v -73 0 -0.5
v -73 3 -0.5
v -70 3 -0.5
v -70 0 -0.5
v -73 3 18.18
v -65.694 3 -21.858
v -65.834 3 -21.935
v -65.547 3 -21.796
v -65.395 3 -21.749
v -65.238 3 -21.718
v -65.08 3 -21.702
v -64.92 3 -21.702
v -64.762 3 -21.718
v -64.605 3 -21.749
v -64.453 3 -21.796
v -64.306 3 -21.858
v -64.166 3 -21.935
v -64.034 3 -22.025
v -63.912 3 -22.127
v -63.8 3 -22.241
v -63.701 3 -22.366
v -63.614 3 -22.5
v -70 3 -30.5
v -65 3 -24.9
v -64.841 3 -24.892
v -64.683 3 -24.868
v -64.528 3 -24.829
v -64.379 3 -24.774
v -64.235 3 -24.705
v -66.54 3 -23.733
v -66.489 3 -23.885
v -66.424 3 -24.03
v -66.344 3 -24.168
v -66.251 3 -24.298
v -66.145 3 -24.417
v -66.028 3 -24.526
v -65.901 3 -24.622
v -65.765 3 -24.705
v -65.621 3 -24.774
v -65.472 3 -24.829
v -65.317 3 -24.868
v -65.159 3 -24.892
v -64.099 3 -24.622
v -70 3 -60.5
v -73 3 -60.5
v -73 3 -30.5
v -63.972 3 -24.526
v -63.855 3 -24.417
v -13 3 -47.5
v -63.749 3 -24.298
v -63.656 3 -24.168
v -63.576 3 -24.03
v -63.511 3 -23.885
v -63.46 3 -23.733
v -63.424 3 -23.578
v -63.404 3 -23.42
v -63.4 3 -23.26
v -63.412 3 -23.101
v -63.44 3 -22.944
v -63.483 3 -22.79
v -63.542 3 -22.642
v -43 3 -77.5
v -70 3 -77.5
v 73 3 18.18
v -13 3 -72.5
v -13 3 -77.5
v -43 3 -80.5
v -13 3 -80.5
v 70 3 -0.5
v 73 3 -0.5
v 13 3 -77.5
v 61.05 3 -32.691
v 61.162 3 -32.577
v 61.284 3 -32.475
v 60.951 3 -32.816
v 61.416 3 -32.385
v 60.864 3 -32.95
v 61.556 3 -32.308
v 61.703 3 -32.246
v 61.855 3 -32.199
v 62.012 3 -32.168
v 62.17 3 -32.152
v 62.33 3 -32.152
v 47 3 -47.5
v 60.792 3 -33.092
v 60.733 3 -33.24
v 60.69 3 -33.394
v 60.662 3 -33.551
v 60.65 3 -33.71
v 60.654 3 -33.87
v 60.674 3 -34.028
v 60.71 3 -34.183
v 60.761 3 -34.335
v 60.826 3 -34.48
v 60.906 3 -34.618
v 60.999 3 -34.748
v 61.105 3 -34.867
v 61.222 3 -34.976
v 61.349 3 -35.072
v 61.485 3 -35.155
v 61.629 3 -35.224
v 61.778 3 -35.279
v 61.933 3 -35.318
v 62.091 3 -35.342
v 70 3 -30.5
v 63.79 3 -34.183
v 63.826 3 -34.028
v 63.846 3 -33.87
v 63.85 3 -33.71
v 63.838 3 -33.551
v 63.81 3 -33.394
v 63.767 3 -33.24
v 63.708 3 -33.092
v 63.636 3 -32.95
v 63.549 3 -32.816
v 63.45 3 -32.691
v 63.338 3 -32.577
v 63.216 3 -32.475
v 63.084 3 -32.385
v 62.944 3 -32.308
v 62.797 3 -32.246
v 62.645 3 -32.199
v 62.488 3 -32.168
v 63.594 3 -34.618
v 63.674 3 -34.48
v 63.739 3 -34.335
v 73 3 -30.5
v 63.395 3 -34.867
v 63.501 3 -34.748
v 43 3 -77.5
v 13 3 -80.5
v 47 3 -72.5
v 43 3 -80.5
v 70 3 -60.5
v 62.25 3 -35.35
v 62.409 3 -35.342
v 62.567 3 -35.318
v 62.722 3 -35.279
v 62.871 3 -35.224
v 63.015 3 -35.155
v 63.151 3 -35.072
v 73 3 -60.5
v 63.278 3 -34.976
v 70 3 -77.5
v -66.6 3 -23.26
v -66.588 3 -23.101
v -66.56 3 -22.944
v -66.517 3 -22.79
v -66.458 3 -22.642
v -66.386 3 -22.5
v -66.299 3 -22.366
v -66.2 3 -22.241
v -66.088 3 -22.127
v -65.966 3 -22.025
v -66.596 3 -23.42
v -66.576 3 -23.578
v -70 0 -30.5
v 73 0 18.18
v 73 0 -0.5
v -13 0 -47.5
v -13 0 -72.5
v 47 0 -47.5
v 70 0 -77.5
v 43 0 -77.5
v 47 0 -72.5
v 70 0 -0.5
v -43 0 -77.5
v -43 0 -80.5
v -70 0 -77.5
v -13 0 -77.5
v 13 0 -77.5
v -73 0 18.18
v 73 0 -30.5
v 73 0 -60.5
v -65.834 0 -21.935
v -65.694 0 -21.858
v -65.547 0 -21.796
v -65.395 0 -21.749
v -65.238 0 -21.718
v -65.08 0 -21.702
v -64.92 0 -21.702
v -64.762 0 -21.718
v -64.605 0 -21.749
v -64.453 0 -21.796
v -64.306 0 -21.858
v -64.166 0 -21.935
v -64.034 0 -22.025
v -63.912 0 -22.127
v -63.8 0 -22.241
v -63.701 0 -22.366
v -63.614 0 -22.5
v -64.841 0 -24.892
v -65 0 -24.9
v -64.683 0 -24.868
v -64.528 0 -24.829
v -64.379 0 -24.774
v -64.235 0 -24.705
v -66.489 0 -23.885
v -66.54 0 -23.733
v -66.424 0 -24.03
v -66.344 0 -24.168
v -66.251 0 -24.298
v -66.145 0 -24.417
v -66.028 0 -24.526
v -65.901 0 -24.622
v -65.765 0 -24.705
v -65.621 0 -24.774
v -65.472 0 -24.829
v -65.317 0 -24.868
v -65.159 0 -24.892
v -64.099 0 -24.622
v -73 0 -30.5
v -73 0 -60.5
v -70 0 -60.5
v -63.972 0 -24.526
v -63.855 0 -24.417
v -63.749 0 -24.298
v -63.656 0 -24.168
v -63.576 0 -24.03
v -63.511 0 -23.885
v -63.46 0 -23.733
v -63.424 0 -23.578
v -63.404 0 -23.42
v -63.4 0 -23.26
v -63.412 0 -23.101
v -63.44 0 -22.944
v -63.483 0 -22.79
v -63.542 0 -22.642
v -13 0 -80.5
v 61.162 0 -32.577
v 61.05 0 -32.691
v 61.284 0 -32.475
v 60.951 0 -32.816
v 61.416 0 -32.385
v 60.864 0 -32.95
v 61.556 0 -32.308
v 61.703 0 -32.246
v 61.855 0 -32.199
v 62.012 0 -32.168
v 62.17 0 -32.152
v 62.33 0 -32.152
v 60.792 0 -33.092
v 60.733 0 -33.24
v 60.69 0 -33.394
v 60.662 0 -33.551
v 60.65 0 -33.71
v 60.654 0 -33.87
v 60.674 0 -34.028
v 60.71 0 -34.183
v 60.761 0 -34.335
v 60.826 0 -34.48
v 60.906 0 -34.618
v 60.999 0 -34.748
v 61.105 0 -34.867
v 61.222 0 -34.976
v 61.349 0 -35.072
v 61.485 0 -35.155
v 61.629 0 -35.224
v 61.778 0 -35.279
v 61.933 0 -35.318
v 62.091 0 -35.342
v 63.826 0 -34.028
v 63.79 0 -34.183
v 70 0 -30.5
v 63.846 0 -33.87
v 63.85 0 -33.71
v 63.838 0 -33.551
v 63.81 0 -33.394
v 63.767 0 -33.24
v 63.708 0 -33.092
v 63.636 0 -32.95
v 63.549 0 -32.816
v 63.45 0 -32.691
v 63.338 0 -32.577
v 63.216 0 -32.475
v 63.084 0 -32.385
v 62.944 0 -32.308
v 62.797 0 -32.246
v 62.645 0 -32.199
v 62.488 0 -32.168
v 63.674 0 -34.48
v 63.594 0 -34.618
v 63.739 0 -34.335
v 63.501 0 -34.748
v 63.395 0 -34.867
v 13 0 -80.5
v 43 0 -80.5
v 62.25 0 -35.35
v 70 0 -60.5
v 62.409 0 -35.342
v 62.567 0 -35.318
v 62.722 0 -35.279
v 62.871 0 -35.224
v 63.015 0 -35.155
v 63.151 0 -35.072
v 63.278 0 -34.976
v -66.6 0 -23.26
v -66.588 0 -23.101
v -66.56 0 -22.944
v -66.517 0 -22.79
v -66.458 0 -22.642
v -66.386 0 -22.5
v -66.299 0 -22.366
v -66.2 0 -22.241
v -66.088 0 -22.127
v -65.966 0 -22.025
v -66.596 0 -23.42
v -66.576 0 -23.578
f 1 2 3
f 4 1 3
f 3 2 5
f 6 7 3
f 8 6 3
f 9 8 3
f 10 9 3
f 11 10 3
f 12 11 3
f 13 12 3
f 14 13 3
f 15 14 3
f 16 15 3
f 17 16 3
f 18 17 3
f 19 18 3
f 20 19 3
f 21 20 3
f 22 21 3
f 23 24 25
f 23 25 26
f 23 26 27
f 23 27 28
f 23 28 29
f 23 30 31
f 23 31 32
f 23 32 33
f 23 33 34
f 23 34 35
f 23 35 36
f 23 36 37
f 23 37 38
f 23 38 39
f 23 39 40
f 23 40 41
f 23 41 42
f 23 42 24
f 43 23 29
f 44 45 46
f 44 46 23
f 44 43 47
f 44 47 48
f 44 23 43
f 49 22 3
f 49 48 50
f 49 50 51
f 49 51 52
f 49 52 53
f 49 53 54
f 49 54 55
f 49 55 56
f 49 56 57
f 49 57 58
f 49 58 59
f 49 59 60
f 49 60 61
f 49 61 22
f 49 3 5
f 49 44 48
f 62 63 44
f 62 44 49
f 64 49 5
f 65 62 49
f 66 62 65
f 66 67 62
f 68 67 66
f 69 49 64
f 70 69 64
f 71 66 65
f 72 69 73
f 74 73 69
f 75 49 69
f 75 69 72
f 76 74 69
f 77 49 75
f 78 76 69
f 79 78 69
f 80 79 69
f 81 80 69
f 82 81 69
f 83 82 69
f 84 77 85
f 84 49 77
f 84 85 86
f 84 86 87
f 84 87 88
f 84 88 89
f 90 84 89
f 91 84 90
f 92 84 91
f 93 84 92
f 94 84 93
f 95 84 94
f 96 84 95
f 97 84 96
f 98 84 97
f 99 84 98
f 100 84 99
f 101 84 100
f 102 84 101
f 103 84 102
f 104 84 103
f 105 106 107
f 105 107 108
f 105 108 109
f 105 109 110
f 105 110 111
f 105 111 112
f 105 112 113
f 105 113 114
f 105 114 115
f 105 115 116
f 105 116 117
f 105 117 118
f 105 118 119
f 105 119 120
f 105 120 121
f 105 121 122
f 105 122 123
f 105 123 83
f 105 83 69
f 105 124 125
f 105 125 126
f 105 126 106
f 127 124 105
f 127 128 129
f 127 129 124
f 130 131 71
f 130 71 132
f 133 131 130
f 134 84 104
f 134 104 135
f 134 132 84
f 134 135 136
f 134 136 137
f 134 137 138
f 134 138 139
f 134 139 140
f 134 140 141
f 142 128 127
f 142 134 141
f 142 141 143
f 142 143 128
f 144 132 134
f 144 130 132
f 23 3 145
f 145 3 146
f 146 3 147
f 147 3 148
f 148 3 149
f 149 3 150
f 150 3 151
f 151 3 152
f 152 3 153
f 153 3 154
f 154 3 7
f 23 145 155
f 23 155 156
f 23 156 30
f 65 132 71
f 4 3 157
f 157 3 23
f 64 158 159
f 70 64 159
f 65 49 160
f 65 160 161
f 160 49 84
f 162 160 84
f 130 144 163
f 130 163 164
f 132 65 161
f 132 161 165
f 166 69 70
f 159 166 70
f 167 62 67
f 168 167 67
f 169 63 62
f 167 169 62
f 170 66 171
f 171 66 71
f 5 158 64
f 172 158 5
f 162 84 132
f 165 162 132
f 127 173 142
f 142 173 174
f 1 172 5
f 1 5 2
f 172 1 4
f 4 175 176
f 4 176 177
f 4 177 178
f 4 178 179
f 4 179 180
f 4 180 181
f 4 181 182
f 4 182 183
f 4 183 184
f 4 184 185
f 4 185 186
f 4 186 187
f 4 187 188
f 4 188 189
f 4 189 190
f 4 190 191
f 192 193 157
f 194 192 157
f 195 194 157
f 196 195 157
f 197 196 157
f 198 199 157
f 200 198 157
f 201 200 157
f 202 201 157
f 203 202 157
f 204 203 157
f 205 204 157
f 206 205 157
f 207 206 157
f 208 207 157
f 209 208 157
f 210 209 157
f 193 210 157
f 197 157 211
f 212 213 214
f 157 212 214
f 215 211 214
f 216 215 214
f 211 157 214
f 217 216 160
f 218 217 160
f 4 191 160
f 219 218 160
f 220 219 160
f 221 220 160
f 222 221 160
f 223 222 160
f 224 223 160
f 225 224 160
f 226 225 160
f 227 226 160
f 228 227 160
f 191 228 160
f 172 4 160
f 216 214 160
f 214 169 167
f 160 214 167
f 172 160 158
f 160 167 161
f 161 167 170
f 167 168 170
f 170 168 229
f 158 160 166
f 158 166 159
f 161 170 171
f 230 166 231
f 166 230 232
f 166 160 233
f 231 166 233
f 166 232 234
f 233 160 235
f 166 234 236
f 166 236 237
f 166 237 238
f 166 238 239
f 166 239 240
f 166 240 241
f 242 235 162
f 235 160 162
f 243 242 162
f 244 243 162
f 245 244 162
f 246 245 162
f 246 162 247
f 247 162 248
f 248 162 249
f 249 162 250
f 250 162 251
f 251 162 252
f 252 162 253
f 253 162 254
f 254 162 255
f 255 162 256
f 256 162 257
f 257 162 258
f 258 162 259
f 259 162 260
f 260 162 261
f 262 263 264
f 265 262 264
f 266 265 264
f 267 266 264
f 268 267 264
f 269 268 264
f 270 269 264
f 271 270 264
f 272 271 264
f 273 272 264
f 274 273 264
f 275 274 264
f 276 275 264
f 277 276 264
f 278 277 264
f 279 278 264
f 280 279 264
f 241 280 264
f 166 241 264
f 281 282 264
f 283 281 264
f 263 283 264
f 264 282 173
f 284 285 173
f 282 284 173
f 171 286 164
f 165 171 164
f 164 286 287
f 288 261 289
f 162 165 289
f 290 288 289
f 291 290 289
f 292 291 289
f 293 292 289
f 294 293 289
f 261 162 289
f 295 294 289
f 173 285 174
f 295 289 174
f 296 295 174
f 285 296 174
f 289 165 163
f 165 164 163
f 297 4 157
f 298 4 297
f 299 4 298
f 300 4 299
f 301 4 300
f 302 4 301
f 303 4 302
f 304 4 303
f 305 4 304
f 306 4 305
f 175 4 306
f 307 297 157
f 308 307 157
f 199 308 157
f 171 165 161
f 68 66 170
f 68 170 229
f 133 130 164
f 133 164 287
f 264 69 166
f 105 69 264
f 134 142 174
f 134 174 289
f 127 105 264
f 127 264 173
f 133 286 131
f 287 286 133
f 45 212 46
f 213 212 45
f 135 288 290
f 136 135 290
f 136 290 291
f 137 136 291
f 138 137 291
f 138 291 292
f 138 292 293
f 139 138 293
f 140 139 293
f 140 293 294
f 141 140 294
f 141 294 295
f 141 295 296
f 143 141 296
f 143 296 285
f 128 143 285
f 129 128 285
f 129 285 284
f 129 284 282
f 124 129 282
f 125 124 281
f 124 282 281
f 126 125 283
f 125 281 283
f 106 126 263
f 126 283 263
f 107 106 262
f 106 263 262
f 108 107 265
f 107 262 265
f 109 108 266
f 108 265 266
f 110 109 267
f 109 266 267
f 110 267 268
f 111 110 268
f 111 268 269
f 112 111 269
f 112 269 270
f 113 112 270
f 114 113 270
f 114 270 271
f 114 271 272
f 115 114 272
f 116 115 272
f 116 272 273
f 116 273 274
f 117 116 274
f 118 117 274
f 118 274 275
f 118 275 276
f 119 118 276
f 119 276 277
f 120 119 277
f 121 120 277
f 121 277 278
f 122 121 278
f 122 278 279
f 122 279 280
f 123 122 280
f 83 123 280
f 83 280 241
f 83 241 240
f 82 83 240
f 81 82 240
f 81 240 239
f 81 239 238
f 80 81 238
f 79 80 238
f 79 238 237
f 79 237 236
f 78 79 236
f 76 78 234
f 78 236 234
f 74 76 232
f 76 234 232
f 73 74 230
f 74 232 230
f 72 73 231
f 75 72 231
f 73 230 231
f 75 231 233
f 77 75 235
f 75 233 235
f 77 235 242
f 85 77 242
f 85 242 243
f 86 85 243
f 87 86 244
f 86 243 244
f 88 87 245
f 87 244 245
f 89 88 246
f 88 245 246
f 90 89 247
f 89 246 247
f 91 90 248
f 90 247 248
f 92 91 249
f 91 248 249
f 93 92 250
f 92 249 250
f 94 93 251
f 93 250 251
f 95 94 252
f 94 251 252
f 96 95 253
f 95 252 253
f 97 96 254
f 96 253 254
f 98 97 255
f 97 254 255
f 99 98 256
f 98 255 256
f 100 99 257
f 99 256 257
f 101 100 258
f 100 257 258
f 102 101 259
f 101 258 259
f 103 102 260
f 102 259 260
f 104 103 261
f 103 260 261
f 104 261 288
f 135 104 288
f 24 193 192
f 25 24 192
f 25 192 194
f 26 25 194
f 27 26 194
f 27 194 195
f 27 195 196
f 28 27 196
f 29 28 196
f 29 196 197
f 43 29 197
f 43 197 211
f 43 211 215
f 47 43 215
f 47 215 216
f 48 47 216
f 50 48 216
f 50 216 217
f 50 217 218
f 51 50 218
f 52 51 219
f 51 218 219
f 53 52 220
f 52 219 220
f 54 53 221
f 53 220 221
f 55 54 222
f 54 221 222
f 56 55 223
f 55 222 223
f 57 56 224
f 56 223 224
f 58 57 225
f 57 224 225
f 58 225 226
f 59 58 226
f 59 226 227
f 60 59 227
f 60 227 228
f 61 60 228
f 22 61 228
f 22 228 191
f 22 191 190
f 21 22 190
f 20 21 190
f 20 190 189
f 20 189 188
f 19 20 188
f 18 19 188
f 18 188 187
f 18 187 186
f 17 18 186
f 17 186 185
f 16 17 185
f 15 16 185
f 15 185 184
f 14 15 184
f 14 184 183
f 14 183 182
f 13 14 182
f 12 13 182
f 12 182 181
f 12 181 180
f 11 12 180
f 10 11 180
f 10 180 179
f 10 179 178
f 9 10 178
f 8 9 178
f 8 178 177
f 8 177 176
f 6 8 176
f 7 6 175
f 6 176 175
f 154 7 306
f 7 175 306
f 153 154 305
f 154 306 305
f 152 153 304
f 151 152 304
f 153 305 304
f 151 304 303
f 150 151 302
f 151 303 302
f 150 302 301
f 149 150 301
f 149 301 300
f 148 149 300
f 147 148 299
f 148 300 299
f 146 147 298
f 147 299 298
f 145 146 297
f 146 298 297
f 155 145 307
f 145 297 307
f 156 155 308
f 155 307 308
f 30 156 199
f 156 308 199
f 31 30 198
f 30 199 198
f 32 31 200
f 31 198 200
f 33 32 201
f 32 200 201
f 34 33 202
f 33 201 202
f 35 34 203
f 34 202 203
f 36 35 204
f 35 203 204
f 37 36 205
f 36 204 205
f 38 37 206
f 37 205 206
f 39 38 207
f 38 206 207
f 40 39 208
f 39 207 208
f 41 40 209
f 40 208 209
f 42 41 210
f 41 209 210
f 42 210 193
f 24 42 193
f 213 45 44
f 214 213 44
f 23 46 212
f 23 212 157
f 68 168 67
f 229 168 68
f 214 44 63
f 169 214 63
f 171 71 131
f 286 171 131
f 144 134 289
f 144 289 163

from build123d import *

# Parameters (mm, degrees)
SKETCH1_W           = 146
SKETCH1_H           = 161
BOSS_EXTRUDE1_DEPTH = 3
SKETCH2_W           = 26
SKETCH2_H           = 3
SKETCH2_W_2         = 3
SKETCH2_H_2         = 30
SKETCH2_W_3         = 60
SKETCH2_H_3         = 25
CUT_EXTRUDE1_DEPTH  = 3
SKETCH3_W           = 146
SKETCH3_H           = 62.32
CUT_EXTRUDE2_DEPTH  = 10
SKETCH4_R           = 1.6
CUT_EXTRUDE3_DEPTH  = 10


with BuildPart() as part:
    # Sketch1 → Boss-Extrude1 (new body)
    with BuildSketch(Plane(origin=(0, 0, 0), x_dir=(1, 0, 0), z_dir=(0, 1, 0))):
        Rectangle(SKETCH1_W, SKETCH1_H)
    extrude(amount=BOSS_EXTRUDE1_DEPTH)

    # Sketch2 → Cut-Extrude1 (cut)
    with BuildSketch(Plane(origin=(0, 3, 0), x_dir=(1, 0, 0), z_dir=(0, 1, 0))):
        with Locations((0, 79)):
            Rectangle(SKETCH2_W, SKETCH2_H)
        with Locations((-71.5, 15.5)):
            Rectangle(SKETCH2_W_2, SKETCH2_H_2)
        Polygon((-73, 80.5), (-73, 60.5), (-70, 60.5), (-70, 77.5), (-43, 77.5), (-43, 80.5), align=None)
        Polygon((73, 80.5), (73, 60.5), (70, 60.5), (70, 77.5), (43, 77.5), (43, 80.5), align=None)
        with Locations((71.5, 15.5)):
            Rectangle(SKETCH2_W_2, SKETCH2_H_2)
        with Locations((-71.5, -44.5)):
            Rectangle(SKETCH2_W_2, SKETCH2_H_2)
        Polygon((-70, -79.5), (-73, -79.5), (-73, -80.5), (-43, -80.5), (-43, -77.5), (-70, -77.5), align=None)
        with Locations((71.5, -44.5)):
            Rectangle(SKETCH2_W_2, SKETCH2_H_2)
        Polygon((70, -79.5), (73, -79.5), (73, -80.5), (70, -80.5), (43, -80.5), (43, -77.5), (70, -77.5), align=None)
        with Locations((0, -79)):
            Rectangle(SKETCH2_W, SKETCH2_H)
        with Locations((17, 60)):
            Rectangle(SKETCH2_W_3, SKETCH2_H_3)
    extrude(amount=-CUT_EXTRUDE1_DEPTH, mode=Mode.SUBTRACT)

    # Sketch3 → Cut-Extrude2 (cut)
    with BuildSketch(Plane(origin=(0, 0, 0), x_dir=(-1, 0, 0), z_dir=(0, -1, 0))):
        with Locations((0, -49.34)):
            Rectangle(SKETCH3_W, SKETCH3_H)
    extrude(amount=-CUT_EXTRUDE2_DEPTH, mode=Mode.SUBTRACT)

    # Sketch4 → Cut-Extrude3 (cut)
    with BuildSketch(Plane.XZ):
        with Locations(Location((62.25, -33.75, 0), (0, 0, 270))):
            Circle(SKETCH4_R)
        with Locations(Location((-65, -23.3, 0), (0, 0, 270))):
            Circle(SKETCH4_R)
    extrude(amount=-CUT_EXTRUDE3_DEPTH, mode=Mode.SUBTRACT)


solid = part.part
